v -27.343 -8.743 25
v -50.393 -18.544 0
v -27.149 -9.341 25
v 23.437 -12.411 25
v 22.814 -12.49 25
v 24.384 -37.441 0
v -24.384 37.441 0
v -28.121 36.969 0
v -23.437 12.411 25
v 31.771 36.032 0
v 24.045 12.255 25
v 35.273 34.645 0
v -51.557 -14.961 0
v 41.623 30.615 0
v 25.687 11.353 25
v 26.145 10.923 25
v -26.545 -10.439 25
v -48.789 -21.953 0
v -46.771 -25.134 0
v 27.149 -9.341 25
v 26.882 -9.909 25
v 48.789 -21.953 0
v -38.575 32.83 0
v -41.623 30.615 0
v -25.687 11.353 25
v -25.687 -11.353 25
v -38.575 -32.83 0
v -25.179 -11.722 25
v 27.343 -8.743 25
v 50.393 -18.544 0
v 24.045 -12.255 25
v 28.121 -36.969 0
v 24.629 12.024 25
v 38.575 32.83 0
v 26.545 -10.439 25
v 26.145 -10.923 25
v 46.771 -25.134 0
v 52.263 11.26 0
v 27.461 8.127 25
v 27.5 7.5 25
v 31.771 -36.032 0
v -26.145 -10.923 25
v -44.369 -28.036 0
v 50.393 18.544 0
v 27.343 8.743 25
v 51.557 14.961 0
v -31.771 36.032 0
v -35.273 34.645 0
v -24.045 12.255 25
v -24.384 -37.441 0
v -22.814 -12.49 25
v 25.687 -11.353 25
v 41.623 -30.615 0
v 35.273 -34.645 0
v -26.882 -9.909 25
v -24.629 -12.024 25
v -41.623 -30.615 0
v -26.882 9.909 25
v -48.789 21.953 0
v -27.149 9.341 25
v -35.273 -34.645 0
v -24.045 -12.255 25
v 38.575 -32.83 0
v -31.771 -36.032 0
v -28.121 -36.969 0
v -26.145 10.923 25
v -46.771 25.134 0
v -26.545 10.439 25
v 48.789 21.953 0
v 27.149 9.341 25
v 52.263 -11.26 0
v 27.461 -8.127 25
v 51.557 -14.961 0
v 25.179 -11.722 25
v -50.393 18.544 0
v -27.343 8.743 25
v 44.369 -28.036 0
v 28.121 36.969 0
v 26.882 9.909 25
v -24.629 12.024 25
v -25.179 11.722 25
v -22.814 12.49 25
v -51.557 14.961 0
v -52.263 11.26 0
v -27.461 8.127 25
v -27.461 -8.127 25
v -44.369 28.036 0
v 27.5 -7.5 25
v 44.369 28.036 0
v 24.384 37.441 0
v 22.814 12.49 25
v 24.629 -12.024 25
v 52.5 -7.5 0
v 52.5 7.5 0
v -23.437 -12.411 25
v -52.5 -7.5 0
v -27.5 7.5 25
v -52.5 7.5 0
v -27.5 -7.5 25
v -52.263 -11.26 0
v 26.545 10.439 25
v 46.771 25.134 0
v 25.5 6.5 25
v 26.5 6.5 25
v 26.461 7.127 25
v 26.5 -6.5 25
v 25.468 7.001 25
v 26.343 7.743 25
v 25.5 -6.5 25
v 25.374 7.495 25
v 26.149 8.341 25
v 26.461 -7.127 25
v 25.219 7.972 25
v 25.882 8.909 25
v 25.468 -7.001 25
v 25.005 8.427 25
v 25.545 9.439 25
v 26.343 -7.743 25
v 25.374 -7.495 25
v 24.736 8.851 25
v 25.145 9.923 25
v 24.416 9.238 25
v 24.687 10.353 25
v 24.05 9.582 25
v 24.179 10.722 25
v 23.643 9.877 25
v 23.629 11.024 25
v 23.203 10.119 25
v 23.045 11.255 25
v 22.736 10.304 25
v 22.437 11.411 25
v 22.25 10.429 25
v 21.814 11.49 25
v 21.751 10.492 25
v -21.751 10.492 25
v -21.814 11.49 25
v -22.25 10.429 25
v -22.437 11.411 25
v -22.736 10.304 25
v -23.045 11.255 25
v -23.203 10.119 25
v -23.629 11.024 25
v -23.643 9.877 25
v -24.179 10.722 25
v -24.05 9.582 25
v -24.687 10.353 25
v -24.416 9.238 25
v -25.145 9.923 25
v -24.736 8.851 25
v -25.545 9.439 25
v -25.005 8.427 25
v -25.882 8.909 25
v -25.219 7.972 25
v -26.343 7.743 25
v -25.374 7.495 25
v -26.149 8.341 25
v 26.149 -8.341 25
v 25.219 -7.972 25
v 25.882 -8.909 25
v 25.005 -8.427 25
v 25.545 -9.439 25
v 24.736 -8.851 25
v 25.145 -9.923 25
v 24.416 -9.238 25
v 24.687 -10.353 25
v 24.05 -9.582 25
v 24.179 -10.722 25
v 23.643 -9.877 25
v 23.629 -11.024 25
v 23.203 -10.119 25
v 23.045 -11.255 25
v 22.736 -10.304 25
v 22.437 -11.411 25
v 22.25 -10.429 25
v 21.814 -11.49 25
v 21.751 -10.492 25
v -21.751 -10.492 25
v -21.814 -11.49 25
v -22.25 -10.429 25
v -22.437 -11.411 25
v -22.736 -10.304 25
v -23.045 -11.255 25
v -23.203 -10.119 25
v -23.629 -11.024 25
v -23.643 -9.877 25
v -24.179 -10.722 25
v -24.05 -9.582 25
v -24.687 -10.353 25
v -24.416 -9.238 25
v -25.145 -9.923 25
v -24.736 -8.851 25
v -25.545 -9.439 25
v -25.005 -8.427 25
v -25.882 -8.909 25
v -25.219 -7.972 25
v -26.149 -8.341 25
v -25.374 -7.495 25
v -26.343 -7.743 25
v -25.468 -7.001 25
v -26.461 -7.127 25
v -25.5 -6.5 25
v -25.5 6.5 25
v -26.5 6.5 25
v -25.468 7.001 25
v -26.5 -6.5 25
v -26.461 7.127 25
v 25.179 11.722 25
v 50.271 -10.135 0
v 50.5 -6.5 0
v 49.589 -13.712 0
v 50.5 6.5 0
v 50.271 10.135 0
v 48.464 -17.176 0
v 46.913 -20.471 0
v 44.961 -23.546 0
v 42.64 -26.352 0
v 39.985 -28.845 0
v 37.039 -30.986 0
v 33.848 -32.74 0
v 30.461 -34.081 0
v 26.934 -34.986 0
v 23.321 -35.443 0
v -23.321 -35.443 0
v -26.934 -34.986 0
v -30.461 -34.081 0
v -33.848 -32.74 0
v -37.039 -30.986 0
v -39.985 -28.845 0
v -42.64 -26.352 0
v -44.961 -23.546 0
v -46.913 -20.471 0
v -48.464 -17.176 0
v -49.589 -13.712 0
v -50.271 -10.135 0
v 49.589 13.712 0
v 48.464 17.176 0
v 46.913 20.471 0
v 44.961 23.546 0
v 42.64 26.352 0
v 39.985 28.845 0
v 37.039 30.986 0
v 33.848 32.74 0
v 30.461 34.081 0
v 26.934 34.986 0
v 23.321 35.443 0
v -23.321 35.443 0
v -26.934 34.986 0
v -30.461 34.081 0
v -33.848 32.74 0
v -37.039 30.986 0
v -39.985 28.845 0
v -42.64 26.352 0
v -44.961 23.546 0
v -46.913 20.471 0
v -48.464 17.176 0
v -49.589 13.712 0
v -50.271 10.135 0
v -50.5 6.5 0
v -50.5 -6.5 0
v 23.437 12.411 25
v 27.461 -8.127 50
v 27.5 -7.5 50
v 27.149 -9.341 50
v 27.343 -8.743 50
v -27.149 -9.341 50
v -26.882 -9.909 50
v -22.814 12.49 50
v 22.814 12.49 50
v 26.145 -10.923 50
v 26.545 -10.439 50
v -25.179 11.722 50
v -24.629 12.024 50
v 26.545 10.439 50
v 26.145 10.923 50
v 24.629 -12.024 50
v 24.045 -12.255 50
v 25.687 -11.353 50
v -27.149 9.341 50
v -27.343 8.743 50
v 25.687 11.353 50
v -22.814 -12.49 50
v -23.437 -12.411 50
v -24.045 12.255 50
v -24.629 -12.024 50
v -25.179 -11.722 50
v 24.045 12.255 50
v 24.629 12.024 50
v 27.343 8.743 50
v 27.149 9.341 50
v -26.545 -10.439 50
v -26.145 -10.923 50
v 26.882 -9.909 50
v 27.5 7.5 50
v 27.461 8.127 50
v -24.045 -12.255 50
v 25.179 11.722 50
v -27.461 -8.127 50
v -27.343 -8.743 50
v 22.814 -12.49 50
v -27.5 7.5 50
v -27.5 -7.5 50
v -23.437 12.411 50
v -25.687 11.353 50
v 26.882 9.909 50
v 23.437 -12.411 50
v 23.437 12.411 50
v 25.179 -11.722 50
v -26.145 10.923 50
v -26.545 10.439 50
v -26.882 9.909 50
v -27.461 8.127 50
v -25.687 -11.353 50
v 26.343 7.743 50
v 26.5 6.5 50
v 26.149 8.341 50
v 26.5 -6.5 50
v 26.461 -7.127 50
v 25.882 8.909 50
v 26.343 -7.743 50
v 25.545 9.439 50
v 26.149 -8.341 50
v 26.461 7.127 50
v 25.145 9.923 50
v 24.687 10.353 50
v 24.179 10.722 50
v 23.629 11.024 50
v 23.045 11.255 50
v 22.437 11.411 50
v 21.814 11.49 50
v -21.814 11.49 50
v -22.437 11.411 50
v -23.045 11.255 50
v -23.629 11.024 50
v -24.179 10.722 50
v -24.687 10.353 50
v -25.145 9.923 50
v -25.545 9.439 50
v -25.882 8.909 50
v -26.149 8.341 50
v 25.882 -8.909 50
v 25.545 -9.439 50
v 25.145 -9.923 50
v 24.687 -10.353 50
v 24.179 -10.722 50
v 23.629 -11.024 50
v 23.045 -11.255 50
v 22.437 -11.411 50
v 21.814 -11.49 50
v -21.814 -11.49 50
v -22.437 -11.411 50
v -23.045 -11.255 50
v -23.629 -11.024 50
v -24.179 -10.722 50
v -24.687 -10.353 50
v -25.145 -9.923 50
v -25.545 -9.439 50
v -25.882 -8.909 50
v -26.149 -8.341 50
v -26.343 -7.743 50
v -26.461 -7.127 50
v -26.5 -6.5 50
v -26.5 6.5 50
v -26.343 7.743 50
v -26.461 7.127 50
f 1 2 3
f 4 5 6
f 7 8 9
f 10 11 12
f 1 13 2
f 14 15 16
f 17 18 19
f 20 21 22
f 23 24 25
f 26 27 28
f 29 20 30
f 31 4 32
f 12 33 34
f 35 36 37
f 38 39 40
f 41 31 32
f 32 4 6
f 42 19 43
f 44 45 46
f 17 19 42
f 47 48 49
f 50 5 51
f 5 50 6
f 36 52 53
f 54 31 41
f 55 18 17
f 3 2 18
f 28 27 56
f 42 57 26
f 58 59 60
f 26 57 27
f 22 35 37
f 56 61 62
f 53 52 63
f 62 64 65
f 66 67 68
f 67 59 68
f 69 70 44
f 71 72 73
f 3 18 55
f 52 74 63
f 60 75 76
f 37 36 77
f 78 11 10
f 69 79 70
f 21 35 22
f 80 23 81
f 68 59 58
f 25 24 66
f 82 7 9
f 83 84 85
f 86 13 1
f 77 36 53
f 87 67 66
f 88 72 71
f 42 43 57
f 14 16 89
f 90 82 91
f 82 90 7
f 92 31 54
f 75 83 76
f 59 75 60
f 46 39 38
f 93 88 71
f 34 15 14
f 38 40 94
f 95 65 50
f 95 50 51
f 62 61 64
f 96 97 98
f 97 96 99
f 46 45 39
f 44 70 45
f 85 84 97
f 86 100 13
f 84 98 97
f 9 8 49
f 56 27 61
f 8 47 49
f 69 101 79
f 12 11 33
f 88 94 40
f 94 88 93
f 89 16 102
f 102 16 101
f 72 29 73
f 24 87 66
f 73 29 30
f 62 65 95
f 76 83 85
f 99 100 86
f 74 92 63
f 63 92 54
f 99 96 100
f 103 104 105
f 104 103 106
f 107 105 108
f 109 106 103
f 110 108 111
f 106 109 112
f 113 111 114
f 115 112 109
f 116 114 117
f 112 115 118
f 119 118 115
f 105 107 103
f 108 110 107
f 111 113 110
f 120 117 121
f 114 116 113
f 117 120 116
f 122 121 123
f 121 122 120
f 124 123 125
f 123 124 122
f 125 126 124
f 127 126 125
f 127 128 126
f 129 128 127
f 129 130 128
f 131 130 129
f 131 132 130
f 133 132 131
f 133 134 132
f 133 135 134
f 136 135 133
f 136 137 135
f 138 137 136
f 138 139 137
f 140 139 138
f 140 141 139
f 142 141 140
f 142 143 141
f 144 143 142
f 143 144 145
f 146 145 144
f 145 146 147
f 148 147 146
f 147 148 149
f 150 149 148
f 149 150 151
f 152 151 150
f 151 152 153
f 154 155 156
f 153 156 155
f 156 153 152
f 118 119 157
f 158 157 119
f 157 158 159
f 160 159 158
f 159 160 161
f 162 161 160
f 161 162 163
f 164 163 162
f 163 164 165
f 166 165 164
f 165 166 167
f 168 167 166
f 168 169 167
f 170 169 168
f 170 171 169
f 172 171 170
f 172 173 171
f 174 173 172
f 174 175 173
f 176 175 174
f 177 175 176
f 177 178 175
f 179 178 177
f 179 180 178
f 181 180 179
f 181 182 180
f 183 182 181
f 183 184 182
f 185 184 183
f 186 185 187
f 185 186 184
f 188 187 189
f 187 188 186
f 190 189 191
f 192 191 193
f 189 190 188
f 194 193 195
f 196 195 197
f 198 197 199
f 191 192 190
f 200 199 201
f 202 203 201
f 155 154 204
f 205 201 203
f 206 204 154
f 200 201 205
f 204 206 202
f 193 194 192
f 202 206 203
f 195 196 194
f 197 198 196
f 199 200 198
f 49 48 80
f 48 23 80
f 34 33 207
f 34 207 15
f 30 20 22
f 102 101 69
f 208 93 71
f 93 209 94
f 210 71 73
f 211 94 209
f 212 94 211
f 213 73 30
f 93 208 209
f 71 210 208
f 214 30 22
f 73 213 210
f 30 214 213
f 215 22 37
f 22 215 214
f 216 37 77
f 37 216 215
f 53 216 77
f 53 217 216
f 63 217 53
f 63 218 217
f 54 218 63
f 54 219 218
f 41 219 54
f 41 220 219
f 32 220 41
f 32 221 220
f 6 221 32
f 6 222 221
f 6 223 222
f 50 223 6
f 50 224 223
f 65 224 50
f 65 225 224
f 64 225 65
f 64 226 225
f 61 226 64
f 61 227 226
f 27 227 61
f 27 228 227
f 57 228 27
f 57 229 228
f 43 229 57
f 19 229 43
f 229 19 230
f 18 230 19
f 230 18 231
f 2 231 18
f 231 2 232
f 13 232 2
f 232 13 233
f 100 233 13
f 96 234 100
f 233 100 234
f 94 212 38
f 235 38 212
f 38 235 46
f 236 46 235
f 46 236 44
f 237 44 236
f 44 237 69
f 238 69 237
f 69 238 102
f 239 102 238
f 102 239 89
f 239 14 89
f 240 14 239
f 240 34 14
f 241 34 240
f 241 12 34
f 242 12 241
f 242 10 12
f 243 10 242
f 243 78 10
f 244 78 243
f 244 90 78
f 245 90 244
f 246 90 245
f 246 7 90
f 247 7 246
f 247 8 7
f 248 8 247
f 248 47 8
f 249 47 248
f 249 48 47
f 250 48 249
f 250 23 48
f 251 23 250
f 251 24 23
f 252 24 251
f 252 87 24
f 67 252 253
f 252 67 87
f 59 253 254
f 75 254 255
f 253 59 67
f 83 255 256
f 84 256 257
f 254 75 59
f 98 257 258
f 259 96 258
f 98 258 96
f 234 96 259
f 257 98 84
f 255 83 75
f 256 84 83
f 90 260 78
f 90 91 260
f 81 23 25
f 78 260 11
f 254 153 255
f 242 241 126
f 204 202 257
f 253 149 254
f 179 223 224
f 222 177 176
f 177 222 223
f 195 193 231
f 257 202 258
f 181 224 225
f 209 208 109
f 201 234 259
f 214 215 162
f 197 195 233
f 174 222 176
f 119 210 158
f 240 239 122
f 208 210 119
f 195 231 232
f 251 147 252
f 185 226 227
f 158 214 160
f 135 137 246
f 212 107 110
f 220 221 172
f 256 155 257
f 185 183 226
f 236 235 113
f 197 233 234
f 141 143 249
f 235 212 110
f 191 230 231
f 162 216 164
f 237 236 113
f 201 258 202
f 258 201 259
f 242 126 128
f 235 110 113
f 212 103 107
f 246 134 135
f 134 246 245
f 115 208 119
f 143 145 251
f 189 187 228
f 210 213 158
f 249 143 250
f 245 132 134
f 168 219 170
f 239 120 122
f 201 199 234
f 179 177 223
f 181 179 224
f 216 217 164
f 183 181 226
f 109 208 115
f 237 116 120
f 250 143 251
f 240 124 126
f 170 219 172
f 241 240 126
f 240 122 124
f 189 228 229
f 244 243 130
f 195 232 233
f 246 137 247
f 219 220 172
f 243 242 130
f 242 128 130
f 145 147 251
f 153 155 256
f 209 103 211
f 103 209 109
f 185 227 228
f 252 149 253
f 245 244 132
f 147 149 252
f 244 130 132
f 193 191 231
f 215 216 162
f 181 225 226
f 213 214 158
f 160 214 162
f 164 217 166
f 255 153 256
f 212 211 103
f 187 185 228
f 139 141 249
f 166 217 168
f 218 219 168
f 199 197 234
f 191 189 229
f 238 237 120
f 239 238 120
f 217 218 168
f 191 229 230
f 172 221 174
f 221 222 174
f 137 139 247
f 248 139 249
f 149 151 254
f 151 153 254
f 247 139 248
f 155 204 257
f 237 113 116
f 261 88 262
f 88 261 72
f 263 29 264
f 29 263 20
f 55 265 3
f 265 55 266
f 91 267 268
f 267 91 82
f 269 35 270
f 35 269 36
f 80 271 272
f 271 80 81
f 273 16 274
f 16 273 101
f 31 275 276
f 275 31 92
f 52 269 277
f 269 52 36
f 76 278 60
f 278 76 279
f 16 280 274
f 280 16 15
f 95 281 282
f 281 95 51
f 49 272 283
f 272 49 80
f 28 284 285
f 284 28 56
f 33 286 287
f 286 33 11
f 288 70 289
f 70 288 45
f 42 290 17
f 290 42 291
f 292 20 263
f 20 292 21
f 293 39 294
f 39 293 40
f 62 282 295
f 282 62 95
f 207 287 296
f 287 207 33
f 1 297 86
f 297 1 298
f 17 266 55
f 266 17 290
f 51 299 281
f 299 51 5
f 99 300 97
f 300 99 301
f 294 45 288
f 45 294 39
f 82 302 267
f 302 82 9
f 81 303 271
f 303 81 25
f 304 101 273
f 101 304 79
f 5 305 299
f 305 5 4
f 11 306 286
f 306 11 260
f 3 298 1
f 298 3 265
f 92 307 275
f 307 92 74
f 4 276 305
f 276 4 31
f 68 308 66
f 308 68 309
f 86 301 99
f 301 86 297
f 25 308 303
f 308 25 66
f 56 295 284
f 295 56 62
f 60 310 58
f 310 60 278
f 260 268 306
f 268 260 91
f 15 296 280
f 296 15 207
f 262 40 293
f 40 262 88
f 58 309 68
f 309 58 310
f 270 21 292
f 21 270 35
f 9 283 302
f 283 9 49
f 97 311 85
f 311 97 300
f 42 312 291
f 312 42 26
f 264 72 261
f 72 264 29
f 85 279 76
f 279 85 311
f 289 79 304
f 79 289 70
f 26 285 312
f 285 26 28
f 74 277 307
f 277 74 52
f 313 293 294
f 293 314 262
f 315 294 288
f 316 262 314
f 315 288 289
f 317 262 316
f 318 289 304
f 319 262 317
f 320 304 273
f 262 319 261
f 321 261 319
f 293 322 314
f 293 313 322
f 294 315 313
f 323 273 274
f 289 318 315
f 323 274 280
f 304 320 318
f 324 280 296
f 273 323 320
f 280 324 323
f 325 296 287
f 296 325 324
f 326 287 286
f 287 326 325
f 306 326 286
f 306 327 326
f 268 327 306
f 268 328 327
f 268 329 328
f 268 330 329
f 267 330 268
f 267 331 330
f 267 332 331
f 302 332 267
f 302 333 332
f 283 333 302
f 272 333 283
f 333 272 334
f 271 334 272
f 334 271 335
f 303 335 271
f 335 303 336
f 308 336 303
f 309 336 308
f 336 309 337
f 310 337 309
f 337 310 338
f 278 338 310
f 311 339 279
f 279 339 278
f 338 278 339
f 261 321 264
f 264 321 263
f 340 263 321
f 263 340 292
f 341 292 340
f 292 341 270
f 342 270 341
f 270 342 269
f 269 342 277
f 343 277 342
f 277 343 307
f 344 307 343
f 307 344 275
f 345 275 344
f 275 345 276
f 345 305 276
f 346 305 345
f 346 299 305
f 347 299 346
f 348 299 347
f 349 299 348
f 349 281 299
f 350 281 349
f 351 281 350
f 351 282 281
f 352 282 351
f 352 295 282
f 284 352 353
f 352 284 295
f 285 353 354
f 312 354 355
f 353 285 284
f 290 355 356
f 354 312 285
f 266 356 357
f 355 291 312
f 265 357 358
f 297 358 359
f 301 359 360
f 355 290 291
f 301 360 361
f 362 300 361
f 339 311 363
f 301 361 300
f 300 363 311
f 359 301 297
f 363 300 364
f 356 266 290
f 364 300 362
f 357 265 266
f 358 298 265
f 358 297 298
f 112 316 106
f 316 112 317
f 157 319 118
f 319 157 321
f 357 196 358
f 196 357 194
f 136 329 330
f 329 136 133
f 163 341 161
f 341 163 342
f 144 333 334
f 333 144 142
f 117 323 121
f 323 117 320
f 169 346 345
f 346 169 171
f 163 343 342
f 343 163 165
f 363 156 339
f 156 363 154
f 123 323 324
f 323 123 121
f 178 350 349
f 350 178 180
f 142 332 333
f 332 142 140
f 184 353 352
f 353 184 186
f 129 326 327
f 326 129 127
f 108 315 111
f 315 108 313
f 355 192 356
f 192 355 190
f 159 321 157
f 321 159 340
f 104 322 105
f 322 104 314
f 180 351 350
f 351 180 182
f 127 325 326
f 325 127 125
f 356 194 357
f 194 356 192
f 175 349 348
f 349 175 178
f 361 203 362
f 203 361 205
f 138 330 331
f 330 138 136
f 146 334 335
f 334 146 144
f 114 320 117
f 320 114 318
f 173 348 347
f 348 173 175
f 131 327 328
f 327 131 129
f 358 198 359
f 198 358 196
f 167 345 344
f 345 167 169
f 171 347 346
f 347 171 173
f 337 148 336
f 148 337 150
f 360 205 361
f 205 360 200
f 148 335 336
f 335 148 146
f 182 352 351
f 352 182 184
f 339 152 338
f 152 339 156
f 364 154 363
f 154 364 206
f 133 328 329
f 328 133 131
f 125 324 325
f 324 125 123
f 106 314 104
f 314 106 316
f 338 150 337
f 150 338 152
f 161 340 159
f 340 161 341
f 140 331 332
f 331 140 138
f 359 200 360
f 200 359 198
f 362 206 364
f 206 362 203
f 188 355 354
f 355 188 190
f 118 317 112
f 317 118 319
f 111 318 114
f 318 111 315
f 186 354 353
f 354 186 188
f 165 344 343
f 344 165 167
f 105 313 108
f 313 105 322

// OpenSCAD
$fn = 50;


difference() {
	union() {
		translate(v = [0, 0, 0]) {
			rotate(a = [0, 0, 0]) {
				difference() {
					union() {
						hull() {
							translate(v = [-22.5000000000, 7.5000000000, 0]) {
								cylinder(h = 25, r = 5, r1 = 30.0000000000, r2 = 5);
							}
							translate(v = [22.5000000000, 7.5000000000, 0]) {
								cylinder(h = 25, r = 5, r1 = 30.0000000000, r2 = 5);
							}
							translate(v = [-22.5000000000, -7.5000000000, 0]) {
								cylinder(h = 25, r = 5, r1 = 30.0000000000, r2 = 5);
							}
							translate(v = [22.5000000000, -7.5000000000, 0]) {
								cylinder(h = 25, r = 5, r1 = 30.0000000000, r2 = 5);
							}
						}
					}
					union() {
						hull() {
							translate(v = [-21.5000000000, 6.5000000000, 0]) {
								cylinder(h = 25, r = 5, r1 = 29.0000000000, r2 = 4);
							}
							translate(v = [21.5000000000, 6.5000000000, 0]) {
								cylinder(h = 25, r = 5, r1 = 29.0000000000, r2 = 4);
							}
							translate(v = [-21.5000000000, -6.5000000000, 0]) {
								cylinder(h = 25, r = 5, r1 = 29.0000000000, r2 = 4);
							}
							translate(v = [21.5000000000, -6.5000000000, 0]) {
								cylinder(h = 25, r = 5, r1 = 29.0000000000, r2 = 4);
							}
						}
					}
				}
			}
		}
		translate(v = [0, 0, 25]) {
			rotate(a = [0, 0, 0]) {
				difference() {
					union() {
						hull() {
							translate(v = [-22.5000000000, 7.5000000000, 0]) {
								cylinder(h = 25, r = 5);
							}
							translate(v = [22.5000000000, 7.5000000000, 0]) {
								cylinder(h = 25, r = 5);
							}
							translate(v = [-22.5000000000, -7.5000000000, 0]) {
								cylinder(h = 25, r = 5);
							}
							translate(v = [22.5000000000, -7.5000000000, 0]) {
								cylinder(h = 25, r = 5);
							}
						}
					}
					union() {
						hull() {
							translate(v = [-21.5000000000, 6.5000000000, 0]) {
								cylinder(h = 25, r = 5);
							}
							translate(v = [21.5000000000, 6.5000000000, 0]) {
								cylinder(h = 25, r = 5);
							}
							translate(v = [-21.5000000000, -6.5000000000, 0]) {
								cylinder(h = 25, r = 5);
							}
							translate(v = [21.5000000000, -6.5000000000, 0]) {
								cylinder(h = 25, r = 5);
							}
						}
					}
				}
			}
		}
	}
	union();
}
